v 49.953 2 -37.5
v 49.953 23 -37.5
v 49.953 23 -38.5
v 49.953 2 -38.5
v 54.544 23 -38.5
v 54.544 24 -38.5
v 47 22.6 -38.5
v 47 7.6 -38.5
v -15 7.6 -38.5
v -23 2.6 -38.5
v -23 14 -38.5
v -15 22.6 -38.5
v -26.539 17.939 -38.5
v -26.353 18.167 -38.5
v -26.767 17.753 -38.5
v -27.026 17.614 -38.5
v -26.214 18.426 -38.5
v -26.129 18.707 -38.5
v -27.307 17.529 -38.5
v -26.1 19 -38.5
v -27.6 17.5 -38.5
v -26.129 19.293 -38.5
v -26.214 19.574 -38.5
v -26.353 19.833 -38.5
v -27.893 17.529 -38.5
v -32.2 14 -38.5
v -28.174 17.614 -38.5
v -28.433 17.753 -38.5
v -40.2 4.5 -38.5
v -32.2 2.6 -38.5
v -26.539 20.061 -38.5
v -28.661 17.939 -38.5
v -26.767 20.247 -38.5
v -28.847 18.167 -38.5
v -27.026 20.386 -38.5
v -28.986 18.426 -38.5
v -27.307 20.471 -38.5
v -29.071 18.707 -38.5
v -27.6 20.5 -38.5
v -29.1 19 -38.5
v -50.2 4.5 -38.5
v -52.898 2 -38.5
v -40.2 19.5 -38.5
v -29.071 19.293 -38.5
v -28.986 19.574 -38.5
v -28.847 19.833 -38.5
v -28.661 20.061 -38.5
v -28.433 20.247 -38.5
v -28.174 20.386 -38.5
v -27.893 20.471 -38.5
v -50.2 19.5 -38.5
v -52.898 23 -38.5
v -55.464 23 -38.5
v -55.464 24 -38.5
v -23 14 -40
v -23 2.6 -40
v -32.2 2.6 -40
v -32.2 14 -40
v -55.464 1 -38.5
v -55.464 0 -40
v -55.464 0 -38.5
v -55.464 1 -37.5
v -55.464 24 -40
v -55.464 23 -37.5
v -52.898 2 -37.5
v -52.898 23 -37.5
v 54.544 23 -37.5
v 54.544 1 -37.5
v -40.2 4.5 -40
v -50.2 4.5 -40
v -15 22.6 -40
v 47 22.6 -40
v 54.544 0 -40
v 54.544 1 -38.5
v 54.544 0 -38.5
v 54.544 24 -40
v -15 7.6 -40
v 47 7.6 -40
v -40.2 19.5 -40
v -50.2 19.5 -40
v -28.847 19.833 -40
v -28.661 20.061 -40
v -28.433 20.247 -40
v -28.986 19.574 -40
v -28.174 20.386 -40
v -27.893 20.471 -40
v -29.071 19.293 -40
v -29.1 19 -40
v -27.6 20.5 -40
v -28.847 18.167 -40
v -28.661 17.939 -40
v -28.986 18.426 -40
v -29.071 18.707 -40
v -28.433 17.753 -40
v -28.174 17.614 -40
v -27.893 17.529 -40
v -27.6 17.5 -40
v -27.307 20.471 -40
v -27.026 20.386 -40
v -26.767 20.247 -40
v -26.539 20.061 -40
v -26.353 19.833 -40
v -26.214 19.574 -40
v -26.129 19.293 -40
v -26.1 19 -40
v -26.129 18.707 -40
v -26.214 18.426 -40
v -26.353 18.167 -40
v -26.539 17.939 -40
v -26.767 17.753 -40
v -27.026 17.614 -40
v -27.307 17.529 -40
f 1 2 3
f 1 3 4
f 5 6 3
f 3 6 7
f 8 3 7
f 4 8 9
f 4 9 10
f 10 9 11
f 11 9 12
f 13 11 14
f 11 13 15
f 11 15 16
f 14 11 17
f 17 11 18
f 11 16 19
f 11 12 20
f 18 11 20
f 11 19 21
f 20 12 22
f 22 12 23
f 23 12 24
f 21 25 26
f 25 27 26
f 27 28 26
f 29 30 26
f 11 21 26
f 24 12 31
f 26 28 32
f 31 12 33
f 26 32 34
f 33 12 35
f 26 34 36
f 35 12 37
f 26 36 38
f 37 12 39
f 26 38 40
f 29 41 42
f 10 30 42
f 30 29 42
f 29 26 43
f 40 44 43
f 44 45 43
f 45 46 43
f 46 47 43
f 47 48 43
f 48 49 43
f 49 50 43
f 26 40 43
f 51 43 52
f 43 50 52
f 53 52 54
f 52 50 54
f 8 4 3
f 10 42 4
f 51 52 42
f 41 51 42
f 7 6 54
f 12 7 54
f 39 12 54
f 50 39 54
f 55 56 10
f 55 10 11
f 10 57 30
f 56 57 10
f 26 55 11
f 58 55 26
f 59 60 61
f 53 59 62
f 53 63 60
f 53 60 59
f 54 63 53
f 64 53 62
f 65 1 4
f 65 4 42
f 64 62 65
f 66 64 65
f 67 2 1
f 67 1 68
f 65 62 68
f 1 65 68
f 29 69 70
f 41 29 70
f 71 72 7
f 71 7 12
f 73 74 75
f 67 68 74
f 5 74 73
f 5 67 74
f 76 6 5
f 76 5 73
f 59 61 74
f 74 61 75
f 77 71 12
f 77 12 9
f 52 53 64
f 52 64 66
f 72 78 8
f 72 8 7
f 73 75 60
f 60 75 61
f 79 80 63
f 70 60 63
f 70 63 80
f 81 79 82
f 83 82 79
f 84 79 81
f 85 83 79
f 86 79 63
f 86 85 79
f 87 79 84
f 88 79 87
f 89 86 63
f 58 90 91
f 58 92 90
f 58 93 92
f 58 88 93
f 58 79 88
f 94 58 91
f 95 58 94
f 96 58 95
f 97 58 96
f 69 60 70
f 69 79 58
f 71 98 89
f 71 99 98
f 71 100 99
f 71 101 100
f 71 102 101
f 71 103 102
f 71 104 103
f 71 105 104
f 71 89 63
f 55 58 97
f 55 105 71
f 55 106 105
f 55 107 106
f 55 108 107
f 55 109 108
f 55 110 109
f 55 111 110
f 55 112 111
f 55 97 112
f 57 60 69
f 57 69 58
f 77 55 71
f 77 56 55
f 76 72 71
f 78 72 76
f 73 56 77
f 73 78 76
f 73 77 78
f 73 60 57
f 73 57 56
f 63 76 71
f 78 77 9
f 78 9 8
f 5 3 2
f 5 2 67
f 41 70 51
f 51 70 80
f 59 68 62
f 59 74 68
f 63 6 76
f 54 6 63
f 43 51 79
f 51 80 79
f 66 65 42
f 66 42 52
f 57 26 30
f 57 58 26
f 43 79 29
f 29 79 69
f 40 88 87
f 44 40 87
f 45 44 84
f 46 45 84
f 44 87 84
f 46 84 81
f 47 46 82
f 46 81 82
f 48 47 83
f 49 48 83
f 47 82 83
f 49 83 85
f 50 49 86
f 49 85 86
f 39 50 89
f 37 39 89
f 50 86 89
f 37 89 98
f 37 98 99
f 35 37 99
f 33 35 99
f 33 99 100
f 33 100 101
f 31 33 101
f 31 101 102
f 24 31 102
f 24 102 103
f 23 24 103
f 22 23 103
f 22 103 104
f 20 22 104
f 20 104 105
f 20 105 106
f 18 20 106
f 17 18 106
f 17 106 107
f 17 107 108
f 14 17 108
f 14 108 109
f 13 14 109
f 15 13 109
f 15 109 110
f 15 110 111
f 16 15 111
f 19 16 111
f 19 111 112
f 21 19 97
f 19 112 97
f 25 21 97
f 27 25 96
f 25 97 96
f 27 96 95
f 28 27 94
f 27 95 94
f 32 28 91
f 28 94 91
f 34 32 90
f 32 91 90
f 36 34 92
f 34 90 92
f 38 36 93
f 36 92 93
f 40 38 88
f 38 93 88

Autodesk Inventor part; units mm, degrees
ref_plane "YZ Plane" through (0, 0, 0) normal (1, 0, 0) x (0, 1, 0)
ref_plane "XZ Plane" through (0, 0, 0) normal (0, 1, 0) x (-1, 0, 0)
sketch "Sketch1" plane through (0, 0, 0) normal (0, 1, 0) x (-1, 0, 0)
  line L0 (60, -40) -> (-60, -40)
  line L1 (-65, -35) -> (-65, 35)
  line L2 (-60, 40) -> (60, 40)
  line L3 (65, 35) -> (65, -35)
  arc A0 (60, -40) -> (65, -35) centre (60, -35) ccw
  arc A1 (-65, -35) -> (-60, -40) centre (-60, -35) ccw
  arc A2 (-60, 40) -> (-65, 35) centre (-60, 35) ccw
  arc A3 (65, 35) -> (60, 40) centre (60, 35) ccw
  line L4 (60, -37.5) -> (-60, -37.5)
  line L5 (-62.5, -35) -> (-62.5, 35)
  line L6 (-60, 37.5) -> (60, 37.5)
  line L7 (62.5, 35) -> (62.5, -35)
  arc A4 (62.5, 35) -> (60, 37.5) centre (60, 35) ccw
  arc A5 (60, -37.5) -> (62.5, -35) centre (60, -35) ccw
  arc A6 (-62.5, -35) -> (-60, -37.5) centre (-60, -35) ccw
  arc A7 (-60, 37.5) -> (-62.5, 35) centre (-60, 35) ccw
  point P0 (0, 0)
  point P1 (-65, 40)
  point P2 (-65, -40)
  point P3 (65, 40)
  dimension "d0" = 130
  dimension "d1" = 80
  dimension "d2" = 5
  dimension "d3" = 2.5
  dimension "d4" = 2.5
  dimension "d5" = 2.5
  dimension "d6" = 2.5
  dimension "d7" = 2.5
  dimension "d32" = 65
  dimension "d33" = 40
extrude "Extrusion1" add sketch "Sketch1" along normal blind 24
sketch "Sketch2" plane through (0, 24, 0) normal (0, 1, 0) x (1, 0, 0)
  line L0 (-60, -38.5) -> (60, -38.5)
  line L1 (63.5, -35) -> (63.5, 35)
  line L2 (60, 38.5) -> (-60, 38.5)
  line L3 (-63.5, 35) -> (-63.5, -35)
  line L4 (-60, 37.5) -> (60, 37.5) projected
  line L5 (62.5, 35) -> (62.5, -35) projected
  line L6 (60, -37.5) -> (-60, -37.5) projected
  line L7 (-62.5, -35) -> (-62.5, 35) projected
  arc A0 (-63.5, -35) -> (-60, -38.5) centre (-60, -35) ccw
  arc A1 (-60, 38.5) -> (-63.5, 35) centre (-60, 35) ccw
  arc A2 (63.5, 35) -> (60, 38.5) centre (60, 35) ccw
  arc A3 (60, -38.5) -> (63.5, -35) centre (60, -35) ccw
  point P0 (0, 0)
  dimension "d10" = 1
  dimension "d11" = 1
  dimension "d12" = 1
  dimension "d13" = 1
  dimension "d14" = 3.5
extrude "Extrusion2" cut sketch "Sketch2" against normal blind 1
ref_plane "Work Plane1" through (0, 12, 0) normal (0, 1, 0) x (1, 0, 0)
mirror "Mirror1" about plane through (0, 12, 0) normal (0, 1, 0) of "Extrusion2"
sketch "Sketch3" plane through (0, 23, 0) normal (0, 1, 0) x (1, 0, 0)
  line L0 (-56.5, 37.5) -> (-62.5, 37.5)
  line L1 (-62.5, 37.5) -> (-62.5, 31.5)
  line L2 (-62.5, 31.5) -> (-56.5, 31.5)
  line L3 (-56.5, 31.5) -> (-56.5, 37.5)
  line L4 (60, 37.5) -> (-60, 37.5) projected
  line L5 (-62.5, 35) -> (-62.5, -35) projected
  circle A0 centre (-60, 35) radius 2.4
  arc A1 (-60, 37.5) -> (-62.5, 35) centre (-60, 35) ccw projected
  point P0 (0, 0)
  dimension "d18" = 6
  dimension "d19" = 6
  dimension "d20" = 4.8
extrude "Extrusion3" add sketch "Sketch3" against normal up to surface (22 mm away)
fillet "Fillet2" radius 3.5 1 edges at (-56.5, 12, -31.5)
mirror "Mirror2" about plane through (0, 0, 0) normal (0, 0, 1) of "Extrusion3", "Fillet2"
mirror "Mirror3" about plane through (0, 0, 0) normal (1, 0, 0) of "Fillet2", "Extrusion3", "Mirror2"
sketch "Sketch7" plane through (60, 0, -40) normal (0, 0, -1) x (-1, 0, 0)
  line L0 (13, 22.6) -> (75, 22.6)
  line L1 (75, 22.6) -> (75, 7.6)
  line L2 (75, 7.6) -> (13, 7.6)
  line L3 (13, 7.6) -> (13, 22.6)
  line L4 (-5, 0) -> (-5, 24) projected
  line L5 (0, 0) -> (120, 0) projected
  point P0 (60, 0)
  dimension "d35" = 62
  dimension "d36" = 15
  dimension "d37" = 18
  dimension "d38" = 7.6
extrude "Extrusion4" cut sketch "Sketch7" against normal blind 24
sketch "Sketch8" plane through (-56.5, 1, -37.5) normal (0, 0, 1) x (1, 0, 0)
  line L0 (-3.5, 22) -> (116.5, 22) projected
  line L1 (3.6019, 22) -> (106.4534, 22)
  line L2 (106.4534, 22) -> (106.4534, 1)
  line L3 (106.4534, 1) -> (3.6019, 1)
  line L4 (3.6019, 1) -> (3.6019, 22)
  point P0 (56.5, -1)
  dimension "d43" = 21
extrude "Extrusion5" cut sketch "Sketch8" against normal blind 1
sketch "Sketch9" plane through (60, 0, -40) normal (0, 0, -1) x (-1, 0, 0)
  line L0 (83, 14) -> (92.2, 14)
  line L1 (92.2, 14) -> (92.2, 2.6)
  line L2 (92.2, 2.6) -> (83, 2.6)
  line L3 (83, 2.6) -> (83, 14)
  line L4 (75, 22.6) -> (75, 7.6) projected
  line L5 (100.2, 4.5) -> (110.2, 4.5)
  line L6 (110.2, 4.5) -> (110.2, 19.5)
  line L7 (110.2, 19.5) -> (100.2, 19.5)
  line L8 (100.2, 19.5) -> (100.2, 4.5)
  circle A0 centre (87.6, 19) radius 1.5
  line L9 (10.0466, 2) -> (112.8981, 2) projected
  line L10 (0, 24) -> (120, 24) projected
  point P0 (60, 0)
  point P1 (83, 8.3)
  dimension "d44" = 8
  dimension "d45" = 9.2
  dimension "d46" = 11.4
  dimension "d47" = 10
  dimension "d48" = 15
  dimension "d49" = 8
  dimension "d50" = 3
  dimension "d51" = 5
  dimension "d54" = 0.6
  dimension "d55" = 4.5
extrude "Extrusion6" cut sketch "Sketch9" against normal blind 2
sketch "Sketch10" plane through (0, 24, 0) normal (0, 1, 0) x (1, 0, 0)
  line L0 (-65.5813, 44.518) -> (-55.4636, 44.518)
  line L1 (-55.4636, 44.518) -> (-55.4636, 27.5938)
  line L2 (-55.4636, 27.5938) -> (54.5438, 27.5938)
  line L3 (54.5438, 27.5938) -> (54.5438, 46.5416)
  line L4 (54.5438, 46.5416) -> (69.4444, 46.5416)
  line L5 (69.4444, 46.5416) -> (73.6755, -45.2538)
  line L6 (73.6755, -45.2538) -> (-73.3076, -45.2538)
  line L7 (-73.3076, -45.2538) -> (-65.5813, 44.518)
  point P0 (0, 0)
extrude "Extrusion7" cut sketch "Sketch10" against normal through all
equation "\"d4\" = d3"
equation "\"d5\" = d3"
equation "\"d6\" = d3"
equation "\"d32\" = 0.5 * d0"
equation "\"d33\" = 0.5 * d1"
equation "\"d11\" = d10"
equation "\"d12\" = d10"
equation "\"d13\" = d10"
properties part number "front_panel"
